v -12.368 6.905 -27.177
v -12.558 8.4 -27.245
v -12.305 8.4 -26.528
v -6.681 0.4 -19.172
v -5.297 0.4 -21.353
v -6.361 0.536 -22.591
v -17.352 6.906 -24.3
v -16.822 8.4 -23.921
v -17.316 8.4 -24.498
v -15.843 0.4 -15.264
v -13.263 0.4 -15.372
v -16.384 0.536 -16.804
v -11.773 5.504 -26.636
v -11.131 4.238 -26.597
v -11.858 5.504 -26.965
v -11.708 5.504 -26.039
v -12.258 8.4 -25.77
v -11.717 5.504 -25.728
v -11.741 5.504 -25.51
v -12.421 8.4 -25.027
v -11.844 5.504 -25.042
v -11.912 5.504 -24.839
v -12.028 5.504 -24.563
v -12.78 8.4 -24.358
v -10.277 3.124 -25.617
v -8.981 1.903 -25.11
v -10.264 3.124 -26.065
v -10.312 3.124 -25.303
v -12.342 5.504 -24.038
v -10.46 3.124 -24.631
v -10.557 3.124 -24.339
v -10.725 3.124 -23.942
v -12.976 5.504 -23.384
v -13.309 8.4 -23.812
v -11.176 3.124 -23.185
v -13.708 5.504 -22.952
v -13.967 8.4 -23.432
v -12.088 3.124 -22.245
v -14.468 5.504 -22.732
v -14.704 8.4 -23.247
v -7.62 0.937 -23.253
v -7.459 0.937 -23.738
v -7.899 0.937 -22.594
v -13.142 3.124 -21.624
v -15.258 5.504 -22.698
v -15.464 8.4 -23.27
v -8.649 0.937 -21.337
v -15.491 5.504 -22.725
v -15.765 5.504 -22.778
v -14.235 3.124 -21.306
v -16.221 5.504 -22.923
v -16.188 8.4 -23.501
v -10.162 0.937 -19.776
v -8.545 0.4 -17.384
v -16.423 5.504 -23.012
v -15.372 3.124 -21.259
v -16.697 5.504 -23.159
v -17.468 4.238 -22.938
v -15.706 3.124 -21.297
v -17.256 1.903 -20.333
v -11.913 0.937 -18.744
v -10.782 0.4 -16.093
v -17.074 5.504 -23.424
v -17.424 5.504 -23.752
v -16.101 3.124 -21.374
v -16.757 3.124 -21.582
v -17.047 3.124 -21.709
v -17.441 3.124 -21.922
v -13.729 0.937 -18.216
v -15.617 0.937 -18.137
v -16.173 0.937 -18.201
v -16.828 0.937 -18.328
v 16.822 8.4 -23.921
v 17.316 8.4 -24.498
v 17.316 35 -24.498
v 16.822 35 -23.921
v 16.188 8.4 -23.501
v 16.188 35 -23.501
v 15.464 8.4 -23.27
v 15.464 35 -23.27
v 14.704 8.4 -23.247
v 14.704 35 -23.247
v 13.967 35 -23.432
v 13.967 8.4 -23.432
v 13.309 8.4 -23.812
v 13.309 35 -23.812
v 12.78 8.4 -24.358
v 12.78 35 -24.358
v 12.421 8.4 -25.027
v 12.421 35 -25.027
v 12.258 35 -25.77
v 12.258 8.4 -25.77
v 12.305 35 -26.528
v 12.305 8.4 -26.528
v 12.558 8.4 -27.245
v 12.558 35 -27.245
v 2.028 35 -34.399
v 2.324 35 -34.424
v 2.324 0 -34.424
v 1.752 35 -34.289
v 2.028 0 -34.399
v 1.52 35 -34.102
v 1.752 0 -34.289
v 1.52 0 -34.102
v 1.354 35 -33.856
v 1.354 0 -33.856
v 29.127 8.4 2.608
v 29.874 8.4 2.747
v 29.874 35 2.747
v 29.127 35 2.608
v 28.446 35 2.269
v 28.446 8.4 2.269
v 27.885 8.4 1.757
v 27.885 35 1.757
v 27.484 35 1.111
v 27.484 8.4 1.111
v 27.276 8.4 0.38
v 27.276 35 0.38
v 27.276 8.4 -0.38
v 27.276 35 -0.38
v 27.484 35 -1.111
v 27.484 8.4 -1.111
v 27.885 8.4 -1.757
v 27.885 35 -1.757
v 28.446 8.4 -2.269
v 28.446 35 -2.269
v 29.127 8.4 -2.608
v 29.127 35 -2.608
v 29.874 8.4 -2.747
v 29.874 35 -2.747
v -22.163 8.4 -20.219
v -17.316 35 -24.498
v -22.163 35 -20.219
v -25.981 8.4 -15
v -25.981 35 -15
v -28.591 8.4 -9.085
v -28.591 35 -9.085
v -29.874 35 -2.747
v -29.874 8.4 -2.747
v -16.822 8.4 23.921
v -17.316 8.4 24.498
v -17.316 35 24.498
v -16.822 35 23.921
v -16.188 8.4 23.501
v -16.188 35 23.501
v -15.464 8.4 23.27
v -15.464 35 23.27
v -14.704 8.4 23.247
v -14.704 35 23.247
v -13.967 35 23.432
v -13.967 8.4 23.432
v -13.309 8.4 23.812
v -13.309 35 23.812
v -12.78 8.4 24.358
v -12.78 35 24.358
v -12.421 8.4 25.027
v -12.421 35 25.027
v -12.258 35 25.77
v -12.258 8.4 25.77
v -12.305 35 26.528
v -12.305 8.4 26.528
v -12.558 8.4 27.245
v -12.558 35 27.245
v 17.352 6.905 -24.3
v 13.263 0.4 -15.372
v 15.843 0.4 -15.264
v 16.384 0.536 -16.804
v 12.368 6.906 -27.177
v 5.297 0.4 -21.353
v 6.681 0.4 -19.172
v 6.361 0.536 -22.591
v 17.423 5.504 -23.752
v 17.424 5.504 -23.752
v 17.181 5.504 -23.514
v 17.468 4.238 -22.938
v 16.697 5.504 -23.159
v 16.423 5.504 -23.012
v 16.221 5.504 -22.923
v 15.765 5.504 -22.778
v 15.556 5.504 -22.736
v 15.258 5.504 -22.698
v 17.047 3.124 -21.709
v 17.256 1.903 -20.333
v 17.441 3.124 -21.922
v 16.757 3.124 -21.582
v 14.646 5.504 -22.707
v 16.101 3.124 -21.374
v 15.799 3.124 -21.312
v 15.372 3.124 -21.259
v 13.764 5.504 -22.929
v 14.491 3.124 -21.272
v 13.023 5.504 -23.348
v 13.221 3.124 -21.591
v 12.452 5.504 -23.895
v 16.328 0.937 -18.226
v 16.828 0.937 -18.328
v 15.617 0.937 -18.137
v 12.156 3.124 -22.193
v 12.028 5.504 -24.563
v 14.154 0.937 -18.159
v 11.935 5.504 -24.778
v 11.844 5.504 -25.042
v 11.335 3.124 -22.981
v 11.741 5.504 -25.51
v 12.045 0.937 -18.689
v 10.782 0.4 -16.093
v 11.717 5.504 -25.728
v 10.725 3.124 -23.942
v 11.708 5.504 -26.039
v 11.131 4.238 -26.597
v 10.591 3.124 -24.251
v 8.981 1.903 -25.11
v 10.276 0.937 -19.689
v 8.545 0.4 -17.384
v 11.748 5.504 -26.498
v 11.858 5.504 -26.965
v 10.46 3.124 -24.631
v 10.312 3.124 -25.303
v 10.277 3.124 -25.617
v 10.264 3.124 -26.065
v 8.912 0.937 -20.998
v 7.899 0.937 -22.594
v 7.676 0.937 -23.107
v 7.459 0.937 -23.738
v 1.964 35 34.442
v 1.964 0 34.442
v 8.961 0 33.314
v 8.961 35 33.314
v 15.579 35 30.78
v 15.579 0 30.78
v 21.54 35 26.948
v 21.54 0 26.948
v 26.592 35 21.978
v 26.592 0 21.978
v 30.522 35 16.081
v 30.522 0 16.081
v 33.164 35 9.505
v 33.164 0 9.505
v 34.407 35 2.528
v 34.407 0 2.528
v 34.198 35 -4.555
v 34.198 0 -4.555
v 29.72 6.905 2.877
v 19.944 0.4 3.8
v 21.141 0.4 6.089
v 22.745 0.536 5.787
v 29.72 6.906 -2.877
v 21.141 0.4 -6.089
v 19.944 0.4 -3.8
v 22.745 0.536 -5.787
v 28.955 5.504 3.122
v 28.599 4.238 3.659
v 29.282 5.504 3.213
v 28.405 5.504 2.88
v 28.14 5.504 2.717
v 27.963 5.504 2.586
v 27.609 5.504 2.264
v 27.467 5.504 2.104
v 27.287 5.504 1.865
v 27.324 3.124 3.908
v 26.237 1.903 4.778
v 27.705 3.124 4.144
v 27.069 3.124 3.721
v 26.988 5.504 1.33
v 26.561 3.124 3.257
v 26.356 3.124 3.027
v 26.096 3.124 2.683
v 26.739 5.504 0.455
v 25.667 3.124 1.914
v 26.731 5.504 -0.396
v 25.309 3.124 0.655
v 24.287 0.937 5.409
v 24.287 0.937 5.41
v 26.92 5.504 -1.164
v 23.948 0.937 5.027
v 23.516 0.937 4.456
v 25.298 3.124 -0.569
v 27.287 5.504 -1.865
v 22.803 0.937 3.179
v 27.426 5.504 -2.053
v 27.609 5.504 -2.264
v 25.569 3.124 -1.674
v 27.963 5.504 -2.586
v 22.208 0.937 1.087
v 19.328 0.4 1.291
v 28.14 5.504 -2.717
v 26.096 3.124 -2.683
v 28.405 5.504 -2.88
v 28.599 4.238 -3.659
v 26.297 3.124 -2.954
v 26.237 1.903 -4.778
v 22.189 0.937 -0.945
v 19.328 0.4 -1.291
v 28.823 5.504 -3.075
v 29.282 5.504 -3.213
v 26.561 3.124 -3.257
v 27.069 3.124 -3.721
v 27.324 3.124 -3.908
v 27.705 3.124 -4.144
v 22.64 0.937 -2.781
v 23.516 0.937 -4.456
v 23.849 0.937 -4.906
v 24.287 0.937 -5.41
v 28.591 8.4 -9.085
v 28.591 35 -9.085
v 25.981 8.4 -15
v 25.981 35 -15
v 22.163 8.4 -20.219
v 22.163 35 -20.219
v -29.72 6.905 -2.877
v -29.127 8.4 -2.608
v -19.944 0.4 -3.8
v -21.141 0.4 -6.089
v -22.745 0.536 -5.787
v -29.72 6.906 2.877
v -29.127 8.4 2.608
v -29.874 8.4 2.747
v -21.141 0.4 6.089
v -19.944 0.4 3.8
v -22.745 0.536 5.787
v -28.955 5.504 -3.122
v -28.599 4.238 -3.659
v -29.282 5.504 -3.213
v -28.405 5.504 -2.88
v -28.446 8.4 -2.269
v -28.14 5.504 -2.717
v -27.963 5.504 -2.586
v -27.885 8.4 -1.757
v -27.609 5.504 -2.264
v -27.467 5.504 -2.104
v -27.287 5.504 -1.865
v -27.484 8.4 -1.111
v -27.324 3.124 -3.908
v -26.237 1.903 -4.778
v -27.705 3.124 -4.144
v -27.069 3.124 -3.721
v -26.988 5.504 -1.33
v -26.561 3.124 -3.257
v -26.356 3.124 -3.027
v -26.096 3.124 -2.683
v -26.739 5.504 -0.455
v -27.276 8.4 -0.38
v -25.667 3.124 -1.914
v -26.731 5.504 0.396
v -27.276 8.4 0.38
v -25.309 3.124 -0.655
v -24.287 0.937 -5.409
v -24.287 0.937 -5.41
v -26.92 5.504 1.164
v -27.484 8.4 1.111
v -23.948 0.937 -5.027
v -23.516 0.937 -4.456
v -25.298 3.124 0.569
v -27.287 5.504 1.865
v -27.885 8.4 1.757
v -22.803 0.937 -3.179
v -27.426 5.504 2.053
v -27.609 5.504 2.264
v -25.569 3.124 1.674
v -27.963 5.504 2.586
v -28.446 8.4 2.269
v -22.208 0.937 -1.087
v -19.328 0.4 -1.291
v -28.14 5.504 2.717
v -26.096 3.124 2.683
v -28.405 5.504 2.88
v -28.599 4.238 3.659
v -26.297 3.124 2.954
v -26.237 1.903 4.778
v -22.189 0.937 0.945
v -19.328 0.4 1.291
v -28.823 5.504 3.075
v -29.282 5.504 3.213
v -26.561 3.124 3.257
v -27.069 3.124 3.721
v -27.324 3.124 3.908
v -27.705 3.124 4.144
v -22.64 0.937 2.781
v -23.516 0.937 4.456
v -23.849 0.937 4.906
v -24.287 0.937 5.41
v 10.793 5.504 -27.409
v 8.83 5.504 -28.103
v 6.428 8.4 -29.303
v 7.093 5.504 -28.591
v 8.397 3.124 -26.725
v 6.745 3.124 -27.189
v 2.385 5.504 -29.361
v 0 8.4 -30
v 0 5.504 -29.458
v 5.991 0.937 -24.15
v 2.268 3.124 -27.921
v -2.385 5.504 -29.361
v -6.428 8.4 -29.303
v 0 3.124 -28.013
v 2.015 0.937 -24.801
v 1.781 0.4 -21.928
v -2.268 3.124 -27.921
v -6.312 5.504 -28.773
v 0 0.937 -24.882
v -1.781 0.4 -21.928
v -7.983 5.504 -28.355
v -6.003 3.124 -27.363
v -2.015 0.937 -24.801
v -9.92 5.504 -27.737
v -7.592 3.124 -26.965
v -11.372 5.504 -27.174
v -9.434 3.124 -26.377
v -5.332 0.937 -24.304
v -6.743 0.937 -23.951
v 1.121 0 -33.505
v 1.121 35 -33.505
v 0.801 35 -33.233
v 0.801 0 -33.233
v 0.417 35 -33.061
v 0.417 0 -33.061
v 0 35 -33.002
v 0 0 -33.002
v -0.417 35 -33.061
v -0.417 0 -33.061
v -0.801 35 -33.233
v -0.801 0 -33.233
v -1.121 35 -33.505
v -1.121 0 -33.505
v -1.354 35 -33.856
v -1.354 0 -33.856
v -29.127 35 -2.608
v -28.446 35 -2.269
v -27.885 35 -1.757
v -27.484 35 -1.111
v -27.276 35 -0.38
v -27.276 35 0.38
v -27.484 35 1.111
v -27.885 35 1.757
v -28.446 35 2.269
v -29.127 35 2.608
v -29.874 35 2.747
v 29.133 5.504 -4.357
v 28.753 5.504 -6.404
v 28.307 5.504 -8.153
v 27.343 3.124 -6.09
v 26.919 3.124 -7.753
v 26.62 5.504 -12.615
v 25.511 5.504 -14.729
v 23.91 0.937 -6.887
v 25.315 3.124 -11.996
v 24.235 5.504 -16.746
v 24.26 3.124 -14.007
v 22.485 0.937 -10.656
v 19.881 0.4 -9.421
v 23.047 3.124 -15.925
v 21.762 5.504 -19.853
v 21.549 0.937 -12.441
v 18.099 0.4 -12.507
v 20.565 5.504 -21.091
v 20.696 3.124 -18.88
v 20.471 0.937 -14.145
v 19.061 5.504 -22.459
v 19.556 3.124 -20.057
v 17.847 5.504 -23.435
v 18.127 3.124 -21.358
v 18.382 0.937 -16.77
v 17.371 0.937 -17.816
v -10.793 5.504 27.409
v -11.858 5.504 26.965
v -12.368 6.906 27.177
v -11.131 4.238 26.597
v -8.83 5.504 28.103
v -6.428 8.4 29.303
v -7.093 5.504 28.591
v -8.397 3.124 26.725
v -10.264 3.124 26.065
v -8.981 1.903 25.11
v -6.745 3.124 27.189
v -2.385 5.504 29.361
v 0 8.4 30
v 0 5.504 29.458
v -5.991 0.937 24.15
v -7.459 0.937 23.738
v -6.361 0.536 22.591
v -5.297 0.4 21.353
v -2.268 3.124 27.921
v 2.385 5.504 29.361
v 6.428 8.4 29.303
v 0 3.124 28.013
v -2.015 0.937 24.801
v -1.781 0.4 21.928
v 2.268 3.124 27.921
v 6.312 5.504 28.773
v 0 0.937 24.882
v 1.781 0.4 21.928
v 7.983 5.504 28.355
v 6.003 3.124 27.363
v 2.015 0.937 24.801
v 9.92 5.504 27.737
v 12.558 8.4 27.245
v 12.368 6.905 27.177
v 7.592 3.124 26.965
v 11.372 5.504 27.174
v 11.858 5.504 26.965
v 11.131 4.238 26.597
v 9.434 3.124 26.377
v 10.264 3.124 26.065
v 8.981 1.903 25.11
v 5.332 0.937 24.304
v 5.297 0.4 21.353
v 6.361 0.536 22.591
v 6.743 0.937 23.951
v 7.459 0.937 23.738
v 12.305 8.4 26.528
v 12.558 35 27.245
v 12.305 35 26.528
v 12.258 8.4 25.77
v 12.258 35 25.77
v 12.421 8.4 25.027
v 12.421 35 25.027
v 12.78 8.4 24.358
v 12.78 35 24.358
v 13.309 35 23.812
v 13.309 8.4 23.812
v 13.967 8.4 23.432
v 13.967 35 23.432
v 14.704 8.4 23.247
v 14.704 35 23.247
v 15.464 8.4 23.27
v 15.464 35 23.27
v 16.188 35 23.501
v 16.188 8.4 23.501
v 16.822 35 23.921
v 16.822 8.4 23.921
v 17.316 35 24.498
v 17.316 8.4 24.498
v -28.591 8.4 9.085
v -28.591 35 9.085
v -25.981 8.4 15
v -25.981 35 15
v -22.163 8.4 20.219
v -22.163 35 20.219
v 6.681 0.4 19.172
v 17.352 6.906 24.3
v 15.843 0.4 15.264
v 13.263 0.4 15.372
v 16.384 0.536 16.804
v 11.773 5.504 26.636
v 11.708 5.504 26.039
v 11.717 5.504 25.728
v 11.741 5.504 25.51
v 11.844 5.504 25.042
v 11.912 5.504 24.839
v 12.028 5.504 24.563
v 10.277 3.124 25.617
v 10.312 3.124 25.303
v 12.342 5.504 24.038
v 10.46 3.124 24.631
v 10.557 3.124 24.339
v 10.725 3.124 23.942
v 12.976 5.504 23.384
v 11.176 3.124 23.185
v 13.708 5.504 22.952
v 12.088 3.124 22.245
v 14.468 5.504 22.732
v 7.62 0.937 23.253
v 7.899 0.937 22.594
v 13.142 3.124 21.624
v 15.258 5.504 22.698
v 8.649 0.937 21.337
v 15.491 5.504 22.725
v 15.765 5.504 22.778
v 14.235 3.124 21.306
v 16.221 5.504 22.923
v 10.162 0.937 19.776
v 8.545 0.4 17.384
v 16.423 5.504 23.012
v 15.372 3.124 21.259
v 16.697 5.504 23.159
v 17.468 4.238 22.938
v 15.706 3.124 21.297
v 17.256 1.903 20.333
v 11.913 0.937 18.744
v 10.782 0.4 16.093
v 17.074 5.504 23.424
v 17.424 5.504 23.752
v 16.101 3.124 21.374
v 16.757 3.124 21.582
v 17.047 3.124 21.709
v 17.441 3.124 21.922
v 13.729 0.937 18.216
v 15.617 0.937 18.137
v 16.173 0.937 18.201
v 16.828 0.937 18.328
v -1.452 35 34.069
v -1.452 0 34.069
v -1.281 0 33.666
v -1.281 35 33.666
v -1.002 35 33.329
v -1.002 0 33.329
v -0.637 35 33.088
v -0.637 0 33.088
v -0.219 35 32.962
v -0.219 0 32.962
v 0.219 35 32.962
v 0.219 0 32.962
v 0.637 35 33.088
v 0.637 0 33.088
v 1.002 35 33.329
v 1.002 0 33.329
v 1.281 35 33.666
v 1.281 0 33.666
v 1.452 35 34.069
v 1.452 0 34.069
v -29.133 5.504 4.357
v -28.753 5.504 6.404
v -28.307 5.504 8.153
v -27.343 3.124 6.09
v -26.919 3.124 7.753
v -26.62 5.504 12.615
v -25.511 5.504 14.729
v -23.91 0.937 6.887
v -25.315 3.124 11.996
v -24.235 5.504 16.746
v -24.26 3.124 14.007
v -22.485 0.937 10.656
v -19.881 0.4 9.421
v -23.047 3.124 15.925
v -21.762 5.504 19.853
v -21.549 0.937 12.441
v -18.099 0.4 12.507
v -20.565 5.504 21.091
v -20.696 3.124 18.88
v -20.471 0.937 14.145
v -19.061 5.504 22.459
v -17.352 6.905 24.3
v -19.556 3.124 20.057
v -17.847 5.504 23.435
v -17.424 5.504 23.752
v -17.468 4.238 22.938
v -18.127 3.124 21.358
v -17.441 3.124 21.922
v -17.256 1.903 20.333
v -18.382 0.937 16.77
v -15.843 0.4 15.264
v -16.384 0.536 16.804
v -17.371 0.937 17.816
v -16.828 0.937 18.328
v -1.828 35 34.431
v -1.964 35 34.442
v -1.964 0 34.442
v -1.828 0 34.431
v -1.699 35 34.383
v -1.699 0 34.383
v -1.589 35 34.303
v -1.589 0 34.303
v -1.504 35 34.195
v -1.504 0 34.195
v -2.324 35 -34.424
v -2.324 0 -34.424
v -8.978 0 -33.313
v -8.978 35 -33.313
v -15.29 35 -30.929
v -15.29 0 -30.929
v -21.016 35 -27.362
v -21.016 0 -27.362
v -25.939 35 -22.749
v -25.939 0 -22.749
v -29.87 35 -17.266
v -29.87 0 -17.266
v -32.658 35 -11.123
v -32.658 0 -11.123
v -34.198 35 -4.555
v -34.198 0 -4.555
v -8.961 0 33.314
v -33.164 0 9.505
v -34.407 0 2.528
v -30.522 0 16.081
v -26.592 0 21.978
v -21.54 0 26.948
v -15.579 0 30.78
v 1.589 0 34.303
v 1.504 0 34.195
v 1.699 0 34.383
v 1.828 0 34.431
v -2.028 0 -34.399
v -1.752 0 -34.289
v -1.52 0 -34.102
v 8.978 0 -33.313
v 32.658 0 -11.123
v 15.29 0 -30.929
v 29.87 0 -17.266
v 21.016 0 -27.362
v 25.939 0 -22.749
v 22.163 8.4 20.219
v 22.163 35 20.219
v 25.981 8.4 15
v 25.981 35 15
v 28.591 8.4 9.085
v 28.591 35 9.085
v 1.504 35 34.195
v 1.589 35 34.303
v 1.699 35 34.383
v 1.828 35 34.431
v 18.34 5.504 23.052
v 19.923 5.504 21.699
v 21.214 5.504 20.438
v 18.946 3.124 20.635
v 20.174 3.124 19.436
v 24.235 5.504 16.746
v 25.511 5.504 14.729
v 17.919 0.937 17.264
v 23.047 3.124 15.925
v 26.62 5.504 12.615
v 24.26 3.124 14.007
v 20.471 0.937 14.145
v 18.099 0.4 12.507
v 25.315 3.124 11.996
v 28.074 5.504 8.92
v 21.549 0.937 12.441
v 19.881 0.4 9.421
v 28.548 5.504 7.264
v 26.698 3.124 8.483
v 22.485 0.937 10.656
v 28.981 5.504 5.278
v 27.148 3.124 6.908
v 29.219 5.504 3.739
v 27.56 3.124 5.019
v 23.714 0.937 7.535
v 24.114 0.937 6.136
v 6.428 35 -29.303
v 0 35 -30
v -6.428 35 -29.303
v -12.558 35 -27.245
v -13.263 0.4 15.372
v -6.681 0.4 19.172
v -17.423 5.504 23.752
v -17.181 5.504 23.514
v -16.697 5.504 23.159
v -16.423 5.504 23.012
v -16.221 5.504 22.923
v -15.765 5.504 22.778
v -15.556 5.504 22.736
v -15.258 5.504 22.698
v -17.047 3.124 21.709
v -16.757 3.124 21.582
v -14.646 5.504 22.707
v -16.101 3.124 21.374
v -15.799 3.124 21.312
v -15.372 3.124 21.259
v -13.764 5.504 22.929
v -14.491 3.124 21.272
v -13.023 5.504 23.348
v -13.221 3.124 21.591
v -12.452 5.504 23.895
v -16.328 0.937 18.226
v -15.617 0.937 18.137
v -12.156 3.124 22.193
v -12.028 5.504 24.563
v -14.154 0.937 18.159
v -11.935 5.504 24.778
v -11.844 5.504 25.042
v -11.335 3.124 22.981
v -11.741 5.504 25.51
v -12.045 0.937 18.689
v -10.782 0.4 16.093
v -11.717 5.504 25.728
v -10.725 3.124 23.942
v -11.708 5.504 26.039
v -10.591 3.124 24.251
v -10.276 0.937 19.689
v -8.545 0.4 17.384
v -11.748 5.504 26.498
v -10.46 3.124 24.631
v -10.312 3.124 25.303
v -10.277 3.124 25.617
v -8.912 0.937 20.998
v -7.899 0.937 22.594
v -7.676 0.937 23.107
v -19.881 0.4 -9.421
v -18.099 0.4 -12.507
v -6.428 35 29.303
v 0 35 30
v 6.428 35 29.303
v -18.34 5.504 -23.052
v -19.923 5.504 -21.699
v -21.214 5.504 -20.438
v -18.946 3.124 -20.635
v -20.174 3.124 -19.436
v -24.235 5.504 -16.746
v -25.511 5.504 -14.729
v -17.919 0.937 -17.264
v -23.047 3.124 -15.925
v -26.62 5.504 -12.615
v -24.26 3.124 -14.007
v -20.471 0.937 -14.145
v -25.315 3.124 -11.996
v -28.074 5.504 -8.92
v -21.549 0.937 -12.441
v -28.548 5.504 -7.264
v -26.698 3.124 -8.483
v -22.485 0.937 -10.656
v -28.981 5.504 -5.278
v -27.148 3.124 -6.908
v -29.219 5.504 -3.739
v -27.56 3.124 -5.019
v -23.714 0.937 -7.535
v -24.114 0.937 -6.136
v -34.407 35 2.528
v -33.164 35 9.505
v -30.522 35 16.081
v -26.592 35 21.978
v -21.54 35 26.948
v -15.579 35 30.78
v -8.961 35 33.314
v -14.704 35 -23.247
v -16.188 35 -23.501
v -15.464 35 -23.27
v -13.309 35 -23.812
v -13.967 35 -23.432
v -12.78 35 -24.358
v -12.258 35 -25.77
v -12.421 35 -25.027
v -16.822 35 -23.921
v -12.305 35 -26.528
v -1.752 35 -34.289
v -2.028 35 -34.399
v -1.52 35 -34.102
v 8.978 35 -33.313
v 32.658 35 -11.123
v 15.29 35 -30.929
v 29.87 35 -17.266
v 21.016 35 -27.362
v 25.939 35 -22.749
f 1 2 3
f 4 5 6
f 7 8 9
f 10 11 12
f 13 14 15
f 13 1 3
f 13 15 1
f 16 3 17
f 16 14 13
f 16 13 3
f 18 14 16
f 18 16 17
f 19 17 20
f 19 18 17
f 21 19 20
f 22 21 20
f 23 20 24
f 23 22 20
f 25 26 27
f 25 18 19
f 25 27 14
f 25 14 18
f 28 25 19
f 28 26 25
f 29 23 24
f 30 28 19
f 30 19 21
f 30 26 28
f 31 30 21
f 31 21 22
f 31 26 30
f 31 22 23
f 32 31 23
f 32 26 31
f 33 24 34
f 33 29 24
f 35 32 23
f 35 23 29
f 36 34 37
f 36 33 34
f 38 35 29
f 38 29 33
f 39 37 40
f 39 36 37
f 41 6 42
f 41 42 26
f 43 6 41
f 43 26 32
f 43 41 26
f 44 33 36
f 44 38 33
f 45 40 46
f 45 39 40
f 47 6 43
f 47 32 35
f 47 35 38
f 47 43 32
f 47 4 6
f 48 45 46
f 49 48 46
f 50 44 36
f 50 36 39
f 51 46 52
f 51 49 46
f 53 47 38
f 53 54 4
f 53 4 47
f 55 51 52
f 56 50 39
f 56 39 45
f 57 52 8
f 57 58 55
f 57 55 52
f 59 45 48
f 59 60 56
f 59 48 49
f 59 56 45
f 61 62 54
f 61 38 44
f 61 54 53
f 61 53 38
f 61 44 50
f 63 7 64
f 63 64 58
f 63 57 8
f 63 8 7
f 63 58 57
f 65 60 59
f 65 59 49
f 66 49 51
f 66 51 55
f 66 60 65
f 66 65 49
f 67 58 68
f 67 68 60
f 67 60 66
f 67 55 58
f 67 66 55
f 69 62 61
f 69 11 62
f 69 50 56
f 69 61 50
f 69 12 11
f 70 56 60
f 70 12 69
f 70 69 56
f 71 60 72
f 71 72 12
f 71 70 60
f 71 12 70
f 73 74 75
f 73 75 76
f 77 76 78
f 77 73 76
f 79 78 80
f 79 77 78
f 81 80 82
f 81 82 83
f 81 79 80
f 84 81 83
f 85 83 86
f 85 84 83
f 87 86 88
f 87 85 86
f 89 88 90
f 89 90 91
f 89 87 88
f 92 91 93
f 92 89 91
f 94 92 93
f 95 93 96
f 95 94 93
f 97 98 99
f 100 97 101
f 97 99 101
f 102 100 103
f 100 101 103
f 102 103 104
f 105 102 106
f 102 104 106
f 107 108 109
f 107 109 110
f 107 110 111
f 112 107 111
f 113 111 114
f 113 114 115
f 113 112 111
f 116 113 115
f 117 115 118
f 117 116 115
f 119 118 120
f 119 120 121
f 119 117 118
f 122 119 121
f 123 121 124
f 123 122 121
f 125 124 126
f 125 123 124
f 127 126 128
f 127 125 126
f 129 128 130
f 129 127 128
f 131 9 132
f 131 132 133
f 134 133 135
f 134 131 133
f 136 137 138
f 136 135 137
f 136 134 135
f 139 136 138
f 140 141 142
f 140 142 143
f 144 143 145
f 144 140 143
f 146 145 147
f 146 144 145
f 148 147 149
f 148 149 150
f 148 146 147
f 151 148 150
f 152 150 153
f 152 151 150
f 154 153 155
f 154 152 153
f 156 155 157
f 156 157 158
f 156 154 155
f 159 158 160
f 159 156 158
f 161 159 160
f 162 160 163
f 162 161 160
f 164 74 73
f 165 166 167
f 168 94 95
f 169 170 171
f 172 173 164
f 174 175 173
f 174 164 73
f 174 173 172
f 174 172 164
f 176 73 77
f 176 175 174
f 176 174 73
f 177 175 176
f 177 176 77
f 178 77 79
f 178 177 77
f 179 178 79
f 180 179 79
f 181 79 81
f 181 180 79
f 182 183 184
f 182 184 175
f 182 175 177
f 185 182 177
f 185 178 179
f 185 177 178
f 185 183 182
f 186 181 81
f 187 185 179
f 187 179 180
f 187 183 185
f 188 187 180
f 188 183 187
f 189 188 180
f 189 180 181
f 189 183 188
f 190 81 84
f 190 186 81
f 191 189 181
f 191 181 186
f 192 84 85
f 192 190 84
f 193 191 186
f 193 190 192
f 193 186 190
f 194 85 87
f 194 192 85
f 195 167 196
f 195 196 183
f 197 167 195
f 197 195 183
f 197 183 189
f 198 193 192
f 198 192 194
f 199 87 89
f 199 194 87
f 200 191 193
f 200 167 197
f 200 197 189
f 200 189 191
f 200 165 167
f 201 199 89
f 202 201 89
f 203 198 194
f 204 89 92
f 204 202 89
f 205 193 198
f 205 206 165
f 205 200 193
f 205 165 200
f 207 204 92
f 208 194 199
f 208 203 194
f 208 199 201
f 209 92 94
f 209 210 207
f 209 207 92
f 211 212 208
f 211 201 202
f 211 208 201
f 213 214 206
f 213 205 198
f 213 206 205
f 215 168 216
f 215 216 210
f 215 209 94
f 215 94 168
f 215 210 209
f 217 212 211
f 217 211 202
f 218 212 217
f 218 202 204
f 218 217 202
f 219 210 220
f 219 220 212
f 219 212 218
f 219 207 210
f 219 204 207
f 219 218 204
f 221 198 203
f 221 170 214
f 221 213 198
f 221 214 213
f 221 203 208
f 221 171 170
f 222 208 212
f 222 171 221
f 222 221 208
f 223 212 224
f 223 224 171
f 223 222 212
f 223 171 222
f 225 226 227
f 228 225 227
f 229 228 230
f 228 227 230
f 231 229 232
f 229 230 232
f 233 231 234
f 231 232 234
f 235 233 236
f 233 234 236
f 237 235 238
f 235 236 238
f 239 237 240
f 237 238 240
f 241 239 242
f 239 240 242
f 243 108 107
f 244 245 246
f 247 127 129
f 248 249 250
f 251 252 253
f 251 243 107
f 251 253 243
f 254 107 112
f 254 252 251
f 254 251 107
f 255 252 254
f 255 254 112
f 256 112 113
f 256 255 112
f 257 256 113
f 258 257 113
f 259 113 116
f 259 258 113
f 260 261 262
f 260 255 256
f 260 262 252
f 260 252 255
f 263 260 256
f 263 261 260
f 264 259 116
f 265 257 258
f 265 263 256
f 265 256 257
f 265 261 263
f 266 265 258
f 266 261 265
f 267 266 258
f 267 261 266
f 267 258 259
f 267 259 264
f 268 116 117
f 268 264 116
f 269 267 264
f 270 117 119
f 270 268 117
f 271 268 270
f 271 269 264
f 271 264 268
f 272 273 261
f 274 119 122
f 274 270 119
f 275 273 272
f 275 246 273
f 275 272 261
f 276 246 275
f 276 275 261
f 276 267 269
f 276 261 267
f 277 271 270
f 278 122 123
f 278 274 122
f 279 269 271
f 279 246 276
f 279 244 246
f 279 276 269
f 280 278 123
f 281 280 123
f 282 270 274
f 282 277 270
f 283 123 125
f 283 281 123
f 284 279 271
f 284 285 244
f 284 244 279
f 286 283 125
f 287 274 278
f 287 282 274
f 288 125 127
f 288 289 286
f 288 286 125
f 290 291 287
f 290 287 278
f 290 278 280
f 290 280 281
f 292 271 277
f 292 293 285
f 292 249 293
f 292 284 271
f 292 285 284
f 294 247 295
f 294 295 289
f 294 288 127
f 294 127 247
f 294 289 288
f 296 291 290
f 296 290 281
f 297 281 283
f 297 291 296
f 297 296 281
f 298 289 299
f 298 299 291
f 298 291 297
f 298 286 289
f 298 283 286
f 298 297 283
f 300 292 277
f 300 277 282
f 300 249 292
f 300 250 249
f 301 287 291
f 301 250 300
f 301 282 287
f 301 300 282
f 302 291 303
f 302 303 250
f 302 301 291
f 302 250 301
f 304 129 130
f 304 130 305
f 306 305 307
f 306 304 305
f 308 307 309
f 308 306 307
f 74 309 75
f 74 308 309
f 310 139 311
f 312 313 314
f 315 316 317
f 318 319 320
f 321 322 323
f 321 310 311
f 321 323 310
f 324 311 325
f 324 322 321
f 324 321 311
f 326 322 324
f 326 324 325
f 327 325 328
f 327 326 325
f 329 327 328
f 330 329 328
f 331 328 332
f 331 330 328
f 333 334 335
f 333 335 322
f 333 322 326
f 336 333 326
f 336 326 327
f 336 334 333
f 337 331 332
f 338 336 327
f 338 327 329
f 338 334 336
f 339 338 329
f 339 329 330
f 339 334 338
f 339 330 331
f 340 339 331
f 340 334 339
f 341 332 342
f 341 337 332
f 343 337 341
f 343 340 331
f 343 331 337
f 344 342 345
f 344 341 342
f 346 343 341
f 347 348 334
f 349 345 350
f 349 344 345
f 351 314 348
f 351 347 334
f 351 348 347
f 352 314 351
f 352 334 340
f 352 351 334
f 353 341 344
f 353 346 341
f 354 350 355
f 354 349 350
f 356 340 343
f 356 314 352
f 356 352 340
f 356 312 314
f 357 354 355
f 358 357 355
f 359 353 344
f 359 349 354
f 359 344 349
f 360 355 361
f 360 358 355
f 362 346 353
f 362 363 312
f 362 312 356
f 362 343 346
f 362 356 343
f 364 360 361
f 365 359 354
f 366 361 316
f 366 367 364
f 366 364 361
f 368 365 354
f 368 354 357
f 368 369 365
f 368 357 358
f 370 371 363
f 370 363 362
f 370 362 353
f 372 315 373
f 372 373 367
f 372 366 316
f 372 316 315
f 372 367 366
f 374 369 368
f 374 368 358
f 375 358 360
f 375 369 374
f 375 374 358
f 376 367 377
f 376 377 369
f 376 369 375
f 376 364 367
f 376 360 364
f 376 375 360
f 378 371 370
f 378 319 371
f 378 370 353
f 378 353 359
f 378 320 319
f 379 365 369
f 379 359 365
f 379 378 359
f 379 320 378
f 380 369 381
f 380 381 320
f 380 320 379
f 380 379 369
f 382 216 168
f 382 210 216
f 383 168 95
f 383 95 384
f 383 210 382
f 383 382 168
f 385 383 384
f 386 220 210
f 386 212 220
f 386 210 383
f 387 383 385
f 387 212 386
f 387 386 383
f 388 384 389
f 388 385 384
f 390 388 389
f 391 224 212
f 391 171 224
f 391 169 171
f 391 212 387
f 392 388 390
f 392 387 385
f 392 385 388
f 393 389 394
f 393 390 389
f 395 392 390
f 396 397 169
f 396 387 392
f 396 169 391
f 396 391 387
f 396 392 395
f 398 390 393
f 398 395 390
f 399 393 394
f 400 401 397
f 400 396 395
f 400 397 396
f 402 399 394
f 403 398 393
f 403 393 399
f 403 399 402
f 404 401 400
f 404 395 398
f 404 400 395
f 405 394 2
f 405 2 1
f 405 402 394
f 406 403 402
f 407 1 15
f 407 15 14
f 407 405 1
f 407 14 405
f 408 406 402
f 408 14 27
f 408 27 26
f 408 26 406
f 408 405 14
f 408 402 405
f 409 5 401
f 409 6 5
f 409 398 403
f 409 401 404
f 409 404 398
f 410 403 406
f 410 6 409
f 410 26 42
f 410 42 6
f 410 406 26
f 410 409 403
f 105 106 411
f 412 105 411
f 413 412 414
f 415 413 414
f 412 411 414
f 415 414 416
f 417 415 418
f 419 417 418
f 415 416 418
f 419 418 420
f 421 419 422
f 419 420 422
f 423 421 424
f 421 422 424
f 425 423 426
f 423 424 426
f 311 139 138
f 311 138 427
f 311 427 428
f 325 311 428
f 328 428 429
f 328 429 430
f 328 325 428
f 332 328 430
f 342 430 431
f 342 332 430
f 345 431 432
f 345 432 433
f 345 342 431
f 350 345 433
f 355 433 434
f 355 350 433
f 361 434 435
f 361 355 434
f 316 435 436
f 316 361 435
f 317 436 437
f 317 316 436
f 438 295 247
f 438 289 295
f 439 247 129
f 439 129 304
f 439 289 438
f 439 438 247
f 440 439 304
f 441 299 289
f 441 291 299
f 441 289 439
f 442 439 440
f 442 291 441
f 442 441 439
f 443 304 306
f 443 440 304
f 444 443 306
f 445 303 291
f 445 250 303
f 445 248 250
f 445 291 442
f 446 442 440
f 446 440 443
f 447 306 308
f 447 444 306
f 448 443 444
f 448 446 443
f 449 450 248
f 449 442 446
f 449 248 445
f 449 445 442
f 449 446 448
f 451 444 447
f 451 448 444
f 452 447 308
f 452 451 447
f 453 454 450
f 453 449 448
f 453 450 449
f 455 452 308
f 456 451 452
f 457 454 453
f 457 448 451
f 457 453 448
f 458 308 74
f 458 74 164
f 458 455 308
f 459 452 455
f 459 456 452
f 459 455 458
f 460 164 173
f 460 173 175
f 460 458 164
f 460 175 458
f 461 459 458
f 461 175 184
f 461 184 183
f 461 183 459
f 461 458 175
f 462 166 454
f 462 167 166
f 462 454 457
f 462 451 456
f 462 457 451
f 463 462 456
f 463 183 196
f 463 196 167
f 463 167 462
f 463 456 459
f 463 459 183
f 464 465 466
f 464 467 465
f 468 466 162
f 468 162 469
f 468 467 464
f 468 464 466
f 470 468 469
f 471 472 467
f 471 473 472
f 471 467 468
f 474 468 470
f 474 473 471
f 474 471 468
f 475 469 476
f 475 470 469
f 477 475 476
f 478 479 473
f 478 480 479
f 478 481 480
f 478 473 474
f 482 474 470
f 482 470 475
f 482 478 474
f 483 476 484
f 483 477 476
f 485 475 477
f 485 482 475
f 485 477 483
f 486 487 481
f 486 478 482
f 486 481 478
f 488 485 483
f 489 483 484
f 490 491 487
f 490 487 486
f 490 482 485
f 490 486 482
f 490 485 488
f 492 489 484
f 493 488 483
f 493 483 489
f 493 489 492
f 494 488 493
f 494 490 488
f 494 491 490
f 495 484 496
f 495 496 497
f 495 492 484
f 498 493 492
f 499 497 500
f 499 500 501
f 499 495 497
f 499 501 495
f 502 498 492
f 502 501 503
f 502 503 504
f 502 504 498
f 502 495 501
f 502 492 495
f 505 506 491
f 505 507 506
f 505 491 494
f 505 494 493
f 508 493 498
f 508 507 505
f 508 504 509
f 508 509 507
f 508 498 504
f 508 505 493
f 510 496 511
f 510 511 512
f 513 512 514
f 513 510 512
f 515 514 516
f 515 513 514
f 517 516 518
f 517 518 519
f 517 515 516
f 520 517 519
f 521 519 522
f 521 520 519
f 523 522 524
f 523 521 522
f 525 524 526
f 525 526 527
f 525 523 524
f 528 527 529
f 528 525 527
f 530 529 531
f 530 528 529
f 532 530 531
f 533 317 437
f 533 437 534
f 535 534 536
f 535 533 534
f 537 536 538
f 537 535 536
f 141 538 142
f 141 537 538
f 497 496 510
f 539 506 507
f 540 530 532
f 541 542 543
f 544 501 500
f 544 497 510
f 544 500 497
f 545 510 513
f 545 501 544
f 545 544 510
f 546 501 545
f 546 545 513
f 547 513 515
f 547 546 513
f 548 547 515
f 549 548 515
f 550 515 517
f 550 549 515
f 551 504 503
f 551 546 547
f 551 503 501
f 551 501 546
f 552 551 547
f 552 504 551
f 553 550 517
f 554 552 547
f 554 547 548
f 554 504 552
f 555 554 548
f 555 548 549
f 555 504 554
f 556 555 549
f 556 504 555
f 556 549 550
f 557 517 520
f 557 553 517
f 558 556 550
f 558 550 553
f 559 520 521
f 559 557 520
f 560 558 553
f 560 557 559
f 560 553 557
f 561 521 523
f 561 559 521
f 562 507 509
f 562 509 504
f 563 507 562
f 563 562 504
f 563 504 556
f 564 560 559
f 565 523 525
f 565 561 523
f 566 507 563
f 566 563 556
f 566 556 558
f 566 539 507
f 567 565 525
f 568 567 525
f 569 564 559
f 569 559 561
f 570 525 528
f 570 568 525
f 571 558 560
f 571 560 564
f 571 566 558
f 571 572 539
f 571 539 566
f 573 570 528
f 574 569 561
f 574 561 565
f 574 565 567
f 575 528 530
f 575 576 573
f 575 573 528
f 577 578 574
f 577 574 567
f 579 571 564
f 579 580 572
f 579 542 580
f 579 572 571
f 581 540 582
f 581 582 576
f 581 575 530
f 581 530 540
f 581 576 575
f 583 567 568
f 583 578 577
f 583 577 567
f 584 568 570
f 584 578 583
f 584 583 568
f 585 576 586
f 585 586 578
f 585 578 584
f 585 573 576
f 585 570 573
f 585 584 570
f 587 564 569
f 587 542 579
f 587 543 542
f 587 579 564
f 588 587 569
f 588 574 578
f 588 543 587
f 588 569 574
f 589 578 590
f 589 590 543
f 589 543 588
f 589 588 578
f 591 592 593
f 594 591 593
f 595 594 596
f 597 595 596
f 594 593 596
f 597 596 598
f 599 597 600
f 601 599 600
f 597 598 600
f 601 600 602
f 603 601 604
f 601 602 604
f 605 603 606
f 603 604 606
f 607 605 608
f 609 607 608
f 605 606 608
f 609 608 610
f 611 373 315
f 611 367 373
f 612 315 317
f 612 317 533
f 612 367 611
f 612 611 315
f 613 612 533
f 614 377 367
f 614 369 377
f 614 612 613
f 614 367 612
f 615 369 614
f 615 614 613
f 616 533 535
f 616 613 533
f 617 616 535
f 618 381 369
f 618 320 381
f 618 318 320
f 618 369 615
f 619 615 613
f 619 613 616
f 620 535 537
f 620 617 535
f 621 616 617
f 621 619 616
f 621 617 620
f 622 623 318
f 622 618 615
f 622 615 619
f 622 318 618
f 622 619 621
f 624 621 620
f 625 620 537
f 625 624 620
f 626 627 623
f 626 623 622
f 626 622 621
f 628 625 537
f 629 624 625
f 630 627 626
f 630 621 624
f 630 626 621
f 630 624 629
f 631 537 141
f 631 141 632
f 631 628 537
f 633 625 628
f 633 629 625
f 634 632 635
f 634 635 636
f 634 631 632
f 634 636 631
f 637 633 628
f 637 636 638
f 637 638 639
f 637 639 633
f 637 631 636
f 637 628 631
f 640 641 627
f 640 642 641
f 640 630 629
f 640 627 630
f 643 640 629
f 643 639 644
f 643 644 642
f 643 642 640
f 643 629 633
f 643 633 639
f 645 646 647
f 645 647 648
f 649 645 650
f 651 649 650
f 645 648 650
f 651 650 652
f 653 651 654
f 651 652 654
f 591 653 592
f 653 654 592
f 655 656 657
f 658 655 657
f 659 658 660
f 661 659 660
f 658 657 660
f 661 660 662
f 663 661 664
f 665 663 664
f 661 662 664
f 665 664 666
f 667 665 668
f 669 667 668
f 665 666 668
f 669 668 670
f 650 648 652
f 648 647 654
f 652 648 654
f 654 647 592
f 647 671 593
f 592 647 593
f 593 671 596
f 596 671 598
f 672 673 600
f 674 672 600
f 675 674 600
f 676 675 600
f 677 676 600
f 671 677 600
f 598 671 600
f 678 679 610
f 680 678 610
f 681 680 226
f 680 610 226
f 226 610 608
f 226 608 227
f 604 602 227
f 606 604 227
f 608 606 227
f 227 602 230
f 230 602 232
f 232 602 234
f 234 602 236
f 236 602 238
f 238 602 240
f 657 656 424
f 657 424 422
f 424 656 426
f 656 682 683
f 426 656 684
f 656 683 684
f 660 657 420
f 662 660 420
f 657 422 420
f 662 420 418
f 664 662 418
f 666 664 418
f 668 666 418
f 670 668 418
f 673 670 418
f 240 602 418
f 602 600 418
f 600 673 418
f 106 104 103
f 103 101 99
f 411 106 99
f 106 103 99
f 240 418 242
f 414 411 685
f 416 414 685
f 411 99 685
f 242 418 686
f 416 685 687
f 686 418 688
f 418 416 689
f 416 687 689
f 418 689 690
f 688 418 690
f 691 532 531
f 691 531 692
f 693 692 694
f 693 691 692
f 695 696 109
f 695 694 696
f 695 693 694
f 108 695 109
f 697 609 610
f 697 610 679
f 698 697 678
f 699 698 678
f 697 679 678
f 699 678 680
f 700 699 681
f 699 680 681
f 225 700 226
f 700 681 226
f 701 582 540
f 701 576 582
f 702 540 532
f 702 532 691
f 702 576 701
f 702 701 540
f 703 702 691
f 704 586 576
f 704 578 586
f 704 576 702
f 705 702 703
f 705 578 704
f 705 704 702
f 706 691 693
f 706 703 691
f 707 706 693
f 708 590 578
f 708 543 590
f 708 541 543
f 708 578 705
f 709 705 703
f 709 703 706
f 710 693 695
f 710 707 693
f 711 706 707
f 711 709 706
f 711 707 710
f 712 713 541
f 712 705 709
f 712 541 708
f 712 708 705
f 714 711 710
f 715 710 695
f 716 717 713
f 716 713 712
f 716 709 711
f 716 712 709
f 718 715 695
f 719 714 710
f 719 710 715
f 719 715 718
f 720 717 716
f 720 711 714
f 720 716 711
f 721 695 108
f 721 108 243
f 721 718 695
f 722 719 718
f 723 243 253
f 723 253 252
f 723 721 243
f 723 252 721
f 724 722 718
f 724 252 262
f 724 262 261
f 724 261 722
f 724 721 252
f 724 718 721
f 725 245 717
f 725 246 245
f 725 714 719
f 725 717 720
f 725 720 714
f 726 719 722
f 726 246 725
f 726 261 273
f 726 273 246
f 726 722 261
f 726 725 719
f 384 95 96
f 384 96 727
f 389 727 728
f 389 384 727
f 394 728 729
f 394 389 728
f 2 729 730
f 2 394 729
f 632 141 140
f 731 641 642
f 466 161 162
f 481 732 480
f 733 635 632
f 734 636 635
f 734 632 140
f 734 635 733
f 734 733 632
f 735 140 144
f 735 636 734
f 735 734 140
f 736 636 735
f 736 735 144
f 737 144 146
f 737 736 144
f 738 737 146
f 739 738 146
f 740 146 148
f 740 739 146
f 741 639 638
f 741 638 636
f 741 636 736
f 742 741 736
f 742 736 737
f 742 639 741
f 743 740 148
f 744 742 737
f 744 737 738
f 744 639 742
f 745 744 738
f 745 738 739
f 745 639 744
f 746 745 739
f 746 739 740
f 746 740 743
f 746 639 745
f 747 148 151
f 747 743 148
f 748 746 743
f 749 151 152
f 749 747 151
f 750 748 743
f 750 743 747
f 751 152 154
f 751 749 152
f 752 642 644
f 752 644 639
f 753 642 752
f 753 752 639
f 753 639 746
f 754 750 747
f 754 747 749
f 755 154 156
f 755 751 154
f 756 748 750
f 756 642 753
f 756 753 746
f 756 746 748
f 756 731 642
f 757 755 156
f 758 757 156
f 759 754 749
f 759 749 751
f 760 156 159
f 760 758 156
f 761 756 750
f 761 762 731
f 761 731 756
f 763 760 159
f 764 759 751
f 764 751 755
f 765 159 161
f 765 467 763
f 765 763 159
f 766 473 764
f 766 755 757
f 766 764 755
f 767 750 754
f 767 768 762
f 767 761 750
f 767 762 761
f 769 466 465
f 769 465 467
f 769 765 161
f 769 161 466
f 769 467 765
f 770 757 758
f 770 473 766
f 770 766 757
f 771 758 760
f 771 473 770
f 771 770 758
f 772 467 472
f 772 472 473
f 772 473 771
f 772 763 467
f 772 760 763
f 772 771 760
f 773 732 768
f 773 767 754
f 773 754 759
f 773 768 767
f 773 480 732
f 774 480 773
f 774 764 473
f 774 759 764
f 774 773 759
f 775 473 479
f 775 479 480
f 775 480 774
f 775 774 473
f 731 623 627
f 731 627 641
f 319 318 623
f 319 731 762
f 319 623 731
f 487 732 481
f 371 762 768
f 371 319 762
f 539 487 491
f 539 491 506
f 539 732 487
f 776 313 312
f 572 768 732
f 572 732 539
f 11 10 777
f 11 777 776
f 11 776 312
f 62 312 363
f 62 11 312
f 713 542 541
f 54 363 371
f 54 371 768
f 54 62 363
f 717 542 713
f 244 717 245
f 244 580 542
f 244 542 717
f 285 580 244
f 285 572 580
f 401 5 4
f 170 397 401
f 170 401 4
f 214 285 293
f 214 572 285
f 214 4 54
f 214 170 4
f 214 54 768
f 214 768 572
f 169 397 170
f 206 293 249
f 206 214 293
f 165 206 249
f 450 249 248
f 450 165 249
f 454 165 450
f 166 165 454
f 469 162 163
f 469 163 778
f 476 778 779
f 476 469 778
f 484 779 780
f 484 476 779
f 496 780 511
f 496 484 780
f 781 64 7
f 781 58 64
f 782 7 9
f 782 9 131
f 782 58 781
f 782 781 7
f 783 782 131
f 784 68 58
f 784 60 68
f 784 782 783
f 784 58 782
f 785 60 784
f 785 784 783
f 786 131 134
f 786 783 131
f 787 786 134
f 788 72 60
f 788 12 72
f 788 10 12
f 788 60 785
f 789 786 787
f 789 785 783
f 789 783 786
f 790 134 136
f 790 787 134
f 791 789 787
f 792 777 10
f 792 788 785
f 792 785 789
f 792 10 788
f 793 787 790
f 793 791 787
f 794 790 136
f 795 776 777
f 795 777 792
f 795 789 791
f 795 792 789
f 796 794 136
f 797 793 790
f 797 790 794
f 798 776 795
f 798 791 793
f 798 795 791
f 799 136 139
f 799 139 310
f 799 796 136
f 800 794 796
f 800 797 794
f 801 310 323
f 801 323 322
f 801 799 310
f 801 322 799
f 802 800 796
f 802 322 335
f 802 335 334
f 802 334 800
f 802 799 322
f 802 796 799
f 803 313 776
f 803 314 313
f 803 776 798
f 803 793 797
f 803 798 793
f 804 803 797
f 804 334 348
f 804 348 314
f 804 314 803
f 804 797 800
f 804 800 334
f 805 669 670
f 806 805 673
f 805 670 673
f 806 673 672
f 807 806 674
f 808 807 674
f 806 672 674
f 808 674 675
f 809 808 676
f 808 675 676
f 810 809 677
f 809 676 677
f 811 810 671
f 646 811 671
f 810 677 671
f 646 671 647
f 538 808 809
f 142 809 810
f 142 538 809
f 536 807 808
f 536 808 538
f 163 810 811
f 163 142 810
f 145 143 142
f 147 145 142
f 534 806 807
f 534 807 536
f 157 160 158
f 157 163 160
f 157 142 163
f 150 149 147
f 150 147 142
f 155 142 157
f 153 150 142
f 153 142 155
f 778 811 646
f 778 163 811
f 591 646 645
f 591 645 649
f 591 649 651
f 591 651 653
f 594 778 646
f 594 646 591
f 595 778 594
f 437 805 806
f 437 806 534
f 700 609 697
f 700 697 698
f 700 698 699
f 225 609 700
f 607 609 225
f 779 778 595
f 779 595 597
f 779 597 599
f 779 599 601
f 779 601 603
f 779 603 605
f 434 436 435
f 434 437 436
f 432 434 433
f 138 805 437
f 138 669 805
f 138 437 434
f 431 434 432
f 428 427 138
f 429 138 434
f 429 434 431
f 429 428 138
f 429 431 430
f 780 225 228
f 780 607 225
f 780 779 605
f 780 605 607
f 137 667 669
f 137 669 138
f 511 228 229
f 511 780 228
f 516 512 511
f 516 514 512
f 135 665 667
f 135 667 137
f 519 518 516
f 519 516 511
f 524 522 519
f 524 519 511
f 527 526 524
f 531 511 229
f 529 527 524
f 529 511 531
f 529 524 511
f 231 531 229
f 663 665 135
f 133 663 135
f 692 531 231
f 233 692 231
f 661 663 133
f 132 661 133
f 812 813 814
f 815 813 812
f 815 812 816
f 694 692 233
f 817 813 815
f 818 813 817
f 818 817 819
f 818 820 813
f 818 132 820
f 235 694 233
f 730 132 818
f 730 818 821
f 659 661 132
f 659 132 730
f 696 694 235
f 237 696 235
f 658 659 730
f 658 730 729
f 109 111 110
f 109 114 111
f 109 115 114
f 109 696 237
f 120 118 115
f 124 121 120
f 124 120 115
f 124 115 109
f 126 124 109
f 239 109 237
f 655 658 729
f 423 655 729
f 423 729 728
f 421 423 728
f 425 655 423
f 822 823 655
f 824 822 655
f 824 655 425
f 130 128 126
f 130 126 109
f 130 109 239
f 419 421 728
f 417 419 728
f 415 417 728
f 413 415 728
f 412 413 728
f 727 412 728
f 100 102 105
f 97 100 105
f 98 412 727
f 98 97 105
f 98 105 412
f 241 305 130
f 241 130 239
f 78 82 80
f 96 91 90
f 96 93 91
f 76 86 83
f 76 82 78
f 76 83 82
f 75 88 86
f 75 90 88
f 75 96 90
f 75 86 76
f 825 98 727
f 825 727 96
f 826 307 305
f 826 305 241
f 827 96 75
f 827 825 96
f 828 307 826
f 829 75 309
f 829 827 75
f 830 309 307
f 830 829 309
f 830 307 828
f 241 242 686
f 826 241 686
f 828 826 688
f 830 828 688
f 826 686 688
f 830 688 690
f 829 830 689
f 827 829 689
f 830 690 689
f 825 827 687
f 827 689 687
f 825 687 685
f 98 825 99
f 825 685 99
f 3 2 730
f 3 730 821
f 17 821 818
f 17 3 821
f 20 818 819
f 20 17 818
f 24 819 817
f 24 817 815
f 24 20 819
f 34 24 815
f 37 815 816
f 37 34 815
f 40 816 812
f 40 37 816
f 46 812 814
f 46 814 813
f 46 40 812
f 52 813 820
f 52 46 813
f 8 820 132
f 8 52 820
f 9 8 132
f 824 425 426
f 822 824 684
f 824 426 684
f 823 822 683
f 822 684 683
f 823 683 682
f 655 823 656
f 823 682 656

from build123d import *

# Parameters (mm, degrees)
BOSS_EXTRUDE1_DEPTH = 35
CUT_EXTRUDE2_DEPTH  = 36
BOSS_EXTRUDE2_DEPTH = 0.4
FILLET1_R           = 8


with BuildPart() as part:
    # Sketch1 → Boss-Extrude1 (new body)
    with BuildSketch(Plane(origin=(0, 0, 0), x_dir=(1, 0, 0), z_dir=(0, 1, 0))):
        with BuildLine():
            ThreePointArc((1.451818925, -34.068556857), (1.641248992, -34.346908706), (1.964225605, -34.442038138))
            ThreePointArc((1.964225605, -34.442038138), (26.591847487, -21.978073076), (34.198225299, 4.555174015))
            ThreePointArc((34.198225299, 4.555174015), (23.590291339, 25.176355888), (2.324135821, 34.423627607))
            ThreePointArc((2.324135821, 34.423627607), (1.751838249, 34.289058819), (1.354061739, 33.856153382))
            ThreePointArc((1.354061739, 33.856153382), (0, 33.001534515), (-1.354061739, 33.856153382))
            ThreePointArc((-1.354061739, 33.856153382), (-1.751838249, 34.289058819), (-2.324135821, 34.423627607))
            ThreePointArc((-2.324135821, 34.423627607), (-23.590291339, 25.176355888), (-34.198225299, 4.555174015))
            ThreePointArc((-34.198225299, 4.555174015), (-26.591847487, -21.978073076), (-1.964225605, -34.442038138))
            ThreePointArc((-1.964225605, -34.442038138), (-1.641248992, -34.346908706), (-1.451818925, -34.068556857))
            ThreePointArc((-1.451818925, -34.068556857), (0, -32.945679925), (1.451818925, -34.068556857))
        make_face()
        with BuildLine():
            Line((-2.417, 3.787737139), (0, 3.787737139))
            Line((0, 3.787737139), (2.417, 3.787737139))
            ThreePointArc((2.417, 3.787737139), (0, -4.489512172), (-2.417, 3.787737139))
        make_face(mode=Mode.SUBTRACT)
    extrude(amount=BOSS_EXTRUDE1_DEPTH)

    # Sketch2 → Cut-Extrude2 (cut, through all)
    with BuildSketch(Plane(origin=(0, 0, 0), x_dir=(1, 0, 0), z_dir=(0, 1, 0))):
        with BuildLine():
            ThreePointArc((-17.316046237, 24.498051815), (-25.980762114, 15), (-29.873958333, 2.747110027))
            ThreePointArc((-29.873958333, 2.747110027), (-27.25, 0), (-29.873958333, -2.747110027))
            ThreePointArc((-29.873958333, -2.747110027), (-25.980762114, -15), (-17.316046237, -24.498051815))
            ThreePointArc((-17.316046237, -24.498051815), (-13.625, -23.599192253), (-12.557912097, -27.245161842))
            ThreePointArc((-12.557912097, -27.245161842), (0, -30), (12.557912097, -27.245161842))
            ThreePointArc((12.557912097, -27.245161842), (13.625, -23.599192253), (17.316046237, -24.498051815))
            ThreePointArc((17.316046237, -24.498051815), (25.980762114, -15), (29.873958333, -2.747110027))
            ThreePointArc((29.873958333, -2.747110027), (27.25, 0), (29.873958333, 2.747110027))
            ThreePointArc((29.873958333, 2.747110027), (25.980762114, 15), (17.316046237, 24.498051815))
            ThreePointArc((17.316046237, 24.498051815), (13.625, 23.599192253), (12.557912097, 27.245161842))
            ThreePointArc((12.557912097, 27.245161842), (0, 30), (-12.557912097, 27.245161842))
            ThreePointArc((-12.557912097, 27.245161842), (-13.625, 23.599192253), (-17.316046237, 24.498051815))
        make_face()
    extrude(amount=CUT_EXTRUDE2_DEPTH, mode=Mode.SUBTRACT)

    # Sketch2<2> → Boss-Extrude2 (add)
    with BuildSketch(Plane(origin=(0, 0, 0), x_dir=(1, 0, 0), z_dir=(0, 1, 0))):
        with BuildLine():
            ThreePointArc((-17.316046237, 24.498051815), (-25.980762114, 15), (-29.873958333, 2.747110027))
            ThreePointArc((-29.873958333, 2.747110027), (-27.25, 0), (-29.873958333, -2.747110027))
            ThreePointArc((-29.873958333, -2.747110027), (-25.980762114, -15), (-17.316046237, -24.498051815))
            ThreePointArc((-17.316046237, -24.498051815), (-13.625, -23.599192253), (-12.557912097, -27.245161842))
            ThreePointArc((-12.557912097, -27.245161842), (0, -30), (12.557912097, -27.245161842))
            ThreePointArc((12.557912097, -27.245161842), (13.625, -23.599192253), (17.316046237, -24.498051815))
            ThreePointArc((17.316046237, -24.498051815), (25.980762114, -15), (29.873958333, -2.747110027))
            ThreePointArc((29.873958333, -2.747110027), (27.25, 0), (29.873958333, 2.747110027))
            ThreePointArc((29.873958333, 2.747110027), (25.980762114, 15), (17.316046237, 24.498051815))
            ThreePointArc((17.316046237, 24.498051815), (13.625, 23.599192253), (12.557912097, 27.245161842))
            ThreePointArc((12.557912097, 27.245161842), (0, 30), (-12.557912097, 27.245161842))
            ThreePointArc((-12.557912097, 27.245161842), (-13.625, 23.599192253), (-17.316046237, 24.498051815))
        make_face()
    extrude(amount=BOSS_EXTRUDE2_DEPTH)

    # Fillet1
    fillet1_edges = [part.edges().sort_by_distance(p)[0] for p in [
        (25.980762114, 0.4, 15),
        (27.25, 0.4, 0),
        (25.980762114, 0.4, -15),
        (13.625, 0.4, -23.599192253),
        (0, 0.4, -30),
        (-13.625, 0.4, -23.599192253),
        (-25.980762114, 0.4, -15),
        (-27.25, 0.4, 0),
        (-25.980762114, 0.4, 15),
        (-13.625, 0.4, 23.599192253),
        (0, 0.4, 30),
        (13.625, 0.4, 23.599192253),
    ]]
    fillet(fillet1_edges, radius=FILLET1_R)


solid = part.part
